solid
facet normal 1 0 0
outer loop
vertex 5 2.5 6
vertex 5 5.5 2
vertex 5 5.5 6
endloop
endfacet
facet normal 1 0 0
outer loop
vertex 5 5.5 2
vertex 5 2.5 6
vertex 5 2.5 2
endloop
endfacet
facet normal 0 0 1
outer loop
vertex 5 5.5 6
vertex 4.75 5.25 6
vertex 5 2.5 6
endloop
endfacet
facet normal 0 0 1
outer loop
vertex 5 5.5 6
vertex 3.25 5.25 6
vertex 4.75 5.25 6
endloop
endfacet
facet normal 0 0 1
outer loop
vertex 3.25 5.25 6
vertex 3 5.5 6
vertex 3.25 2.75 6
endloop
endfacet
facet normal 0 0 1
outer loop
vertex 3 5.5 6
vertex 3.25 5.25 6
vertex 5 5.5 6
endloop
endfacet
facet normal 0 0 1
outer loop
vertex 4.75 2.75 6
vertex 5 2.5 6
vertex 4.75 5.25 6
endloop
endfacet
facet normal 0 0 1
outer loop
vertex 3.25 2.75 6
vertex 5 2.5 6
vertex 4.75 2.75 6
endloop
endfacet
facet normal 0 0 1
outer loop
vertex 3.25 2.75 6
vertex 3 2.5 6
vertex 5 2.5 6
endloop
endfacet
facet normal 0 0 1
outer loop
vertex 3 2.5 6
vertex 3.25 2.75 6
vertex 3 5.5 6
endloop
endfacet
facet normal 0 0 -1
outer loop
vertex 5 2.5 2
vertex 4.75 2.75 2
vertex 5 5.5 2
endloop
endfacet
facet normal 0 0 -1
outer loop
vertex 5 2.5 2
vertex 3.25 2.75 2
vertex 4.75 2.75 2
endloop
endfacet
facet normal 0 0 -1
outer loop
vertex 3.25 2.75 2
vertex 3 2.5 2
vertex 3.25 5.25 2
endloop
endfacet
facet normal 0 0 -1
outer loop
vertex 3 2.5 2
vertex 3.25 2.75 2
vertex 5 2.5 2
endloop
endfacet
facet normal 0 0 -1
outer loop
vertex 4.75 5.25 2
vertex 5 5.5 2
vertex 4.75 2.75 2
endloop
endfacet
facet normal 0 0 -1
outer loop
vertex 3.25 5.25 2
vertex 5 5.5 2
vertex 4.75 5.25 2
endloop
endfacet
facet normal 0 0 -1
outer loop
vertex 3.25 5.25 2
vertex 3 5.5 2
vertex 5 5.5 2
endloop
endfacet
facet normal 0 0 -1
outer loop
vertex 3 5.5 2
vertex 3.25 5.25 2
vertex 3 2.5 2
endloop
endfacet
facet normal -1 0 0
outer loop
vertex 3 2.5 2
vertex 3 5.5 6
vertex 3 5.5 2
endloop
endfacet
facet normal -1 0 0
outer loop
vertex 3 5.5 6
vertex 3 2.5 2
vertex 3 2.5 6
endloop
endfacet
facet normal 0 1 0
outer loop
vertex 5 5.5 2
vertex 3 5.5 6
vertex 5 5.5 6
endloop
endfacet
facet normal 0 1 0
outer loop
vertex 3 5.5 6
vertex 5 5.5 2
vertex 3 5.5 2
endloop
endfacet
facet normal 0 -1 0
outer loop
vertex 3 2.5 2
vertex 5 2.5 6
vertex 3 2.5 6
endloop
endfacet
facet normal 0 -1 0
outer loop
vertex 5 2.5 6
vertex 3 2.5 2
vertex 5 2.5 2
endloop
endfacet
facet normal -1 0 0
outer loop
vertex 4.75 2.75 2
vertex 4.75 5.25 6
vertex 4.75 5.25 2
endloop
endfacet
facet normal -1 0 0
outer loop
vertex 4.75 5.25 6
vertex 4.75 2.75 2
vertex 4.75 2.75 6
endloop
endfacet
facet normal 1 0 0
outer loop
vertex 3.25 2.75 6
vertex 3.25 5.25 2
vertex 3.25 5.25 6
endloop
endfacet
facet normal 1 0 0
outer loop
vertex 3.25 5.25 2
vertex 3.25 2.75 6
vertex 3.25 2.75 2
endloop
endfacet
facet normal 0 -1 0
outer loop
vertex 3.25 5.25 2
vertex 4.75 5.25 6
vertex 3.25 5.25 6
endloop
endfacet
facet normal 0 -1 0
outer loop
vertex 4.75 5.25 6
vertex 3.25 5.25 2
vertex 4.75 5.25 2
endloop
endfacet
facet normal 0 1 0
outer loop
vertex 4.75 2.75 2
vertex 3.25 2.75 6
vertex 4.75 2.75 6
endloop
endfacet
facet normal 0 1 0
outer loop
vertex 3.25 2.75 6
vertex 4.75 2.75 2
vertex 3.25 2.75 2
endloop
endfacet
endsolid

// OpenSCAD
// center, box dimensions
obj_bb     = [[4, 4, 4], [2, 3, 4]];

difference() {
  obj();
  #zhole();
}

module obj() {
  translate(obj_bb[0]) cube(obj_bb[1], center=true);
}

module zhole() {
  translate(obj_bb[0]) cube(obj_bb[1] + [-.5, -.5, .5], center=true);
}

// bb is bounding box as [center, dimensions] where
// - center: 3-vector for the center of the bounding box
// - dimensions: 3-vector for the size of the box in each direction

function bb_xmin(bb) = bb[0].x - bb[1].x/2;
function bb_ymin(bb) = bb[0].y - bb[1].y/2;
function bb_zmin(bb) = bb[0].z - bb[1].z/2;

function bb_xmax(bb) = bb[0].x + bb[1].x/2;
function bb_ymax(bb) = bb[0].y + bb[1].y/2;
function bb_zmax(bb) = bb[0].z + bb[1].z/2;

function bb_dim(bb) = bb[1];
function bb_xdim(bb) = bb[1].x;
function bb_ydim(bb) = bb[1].y;
function bb_zdim(bb) = bb[1].z;

function bb_center(bb) = bb[0];
function bb_xcenter(bb) = bb[0].x;
function bb_ycenter(bb) = bb[0].y;
function bb_zcenter(bb) = bb[0].z;
